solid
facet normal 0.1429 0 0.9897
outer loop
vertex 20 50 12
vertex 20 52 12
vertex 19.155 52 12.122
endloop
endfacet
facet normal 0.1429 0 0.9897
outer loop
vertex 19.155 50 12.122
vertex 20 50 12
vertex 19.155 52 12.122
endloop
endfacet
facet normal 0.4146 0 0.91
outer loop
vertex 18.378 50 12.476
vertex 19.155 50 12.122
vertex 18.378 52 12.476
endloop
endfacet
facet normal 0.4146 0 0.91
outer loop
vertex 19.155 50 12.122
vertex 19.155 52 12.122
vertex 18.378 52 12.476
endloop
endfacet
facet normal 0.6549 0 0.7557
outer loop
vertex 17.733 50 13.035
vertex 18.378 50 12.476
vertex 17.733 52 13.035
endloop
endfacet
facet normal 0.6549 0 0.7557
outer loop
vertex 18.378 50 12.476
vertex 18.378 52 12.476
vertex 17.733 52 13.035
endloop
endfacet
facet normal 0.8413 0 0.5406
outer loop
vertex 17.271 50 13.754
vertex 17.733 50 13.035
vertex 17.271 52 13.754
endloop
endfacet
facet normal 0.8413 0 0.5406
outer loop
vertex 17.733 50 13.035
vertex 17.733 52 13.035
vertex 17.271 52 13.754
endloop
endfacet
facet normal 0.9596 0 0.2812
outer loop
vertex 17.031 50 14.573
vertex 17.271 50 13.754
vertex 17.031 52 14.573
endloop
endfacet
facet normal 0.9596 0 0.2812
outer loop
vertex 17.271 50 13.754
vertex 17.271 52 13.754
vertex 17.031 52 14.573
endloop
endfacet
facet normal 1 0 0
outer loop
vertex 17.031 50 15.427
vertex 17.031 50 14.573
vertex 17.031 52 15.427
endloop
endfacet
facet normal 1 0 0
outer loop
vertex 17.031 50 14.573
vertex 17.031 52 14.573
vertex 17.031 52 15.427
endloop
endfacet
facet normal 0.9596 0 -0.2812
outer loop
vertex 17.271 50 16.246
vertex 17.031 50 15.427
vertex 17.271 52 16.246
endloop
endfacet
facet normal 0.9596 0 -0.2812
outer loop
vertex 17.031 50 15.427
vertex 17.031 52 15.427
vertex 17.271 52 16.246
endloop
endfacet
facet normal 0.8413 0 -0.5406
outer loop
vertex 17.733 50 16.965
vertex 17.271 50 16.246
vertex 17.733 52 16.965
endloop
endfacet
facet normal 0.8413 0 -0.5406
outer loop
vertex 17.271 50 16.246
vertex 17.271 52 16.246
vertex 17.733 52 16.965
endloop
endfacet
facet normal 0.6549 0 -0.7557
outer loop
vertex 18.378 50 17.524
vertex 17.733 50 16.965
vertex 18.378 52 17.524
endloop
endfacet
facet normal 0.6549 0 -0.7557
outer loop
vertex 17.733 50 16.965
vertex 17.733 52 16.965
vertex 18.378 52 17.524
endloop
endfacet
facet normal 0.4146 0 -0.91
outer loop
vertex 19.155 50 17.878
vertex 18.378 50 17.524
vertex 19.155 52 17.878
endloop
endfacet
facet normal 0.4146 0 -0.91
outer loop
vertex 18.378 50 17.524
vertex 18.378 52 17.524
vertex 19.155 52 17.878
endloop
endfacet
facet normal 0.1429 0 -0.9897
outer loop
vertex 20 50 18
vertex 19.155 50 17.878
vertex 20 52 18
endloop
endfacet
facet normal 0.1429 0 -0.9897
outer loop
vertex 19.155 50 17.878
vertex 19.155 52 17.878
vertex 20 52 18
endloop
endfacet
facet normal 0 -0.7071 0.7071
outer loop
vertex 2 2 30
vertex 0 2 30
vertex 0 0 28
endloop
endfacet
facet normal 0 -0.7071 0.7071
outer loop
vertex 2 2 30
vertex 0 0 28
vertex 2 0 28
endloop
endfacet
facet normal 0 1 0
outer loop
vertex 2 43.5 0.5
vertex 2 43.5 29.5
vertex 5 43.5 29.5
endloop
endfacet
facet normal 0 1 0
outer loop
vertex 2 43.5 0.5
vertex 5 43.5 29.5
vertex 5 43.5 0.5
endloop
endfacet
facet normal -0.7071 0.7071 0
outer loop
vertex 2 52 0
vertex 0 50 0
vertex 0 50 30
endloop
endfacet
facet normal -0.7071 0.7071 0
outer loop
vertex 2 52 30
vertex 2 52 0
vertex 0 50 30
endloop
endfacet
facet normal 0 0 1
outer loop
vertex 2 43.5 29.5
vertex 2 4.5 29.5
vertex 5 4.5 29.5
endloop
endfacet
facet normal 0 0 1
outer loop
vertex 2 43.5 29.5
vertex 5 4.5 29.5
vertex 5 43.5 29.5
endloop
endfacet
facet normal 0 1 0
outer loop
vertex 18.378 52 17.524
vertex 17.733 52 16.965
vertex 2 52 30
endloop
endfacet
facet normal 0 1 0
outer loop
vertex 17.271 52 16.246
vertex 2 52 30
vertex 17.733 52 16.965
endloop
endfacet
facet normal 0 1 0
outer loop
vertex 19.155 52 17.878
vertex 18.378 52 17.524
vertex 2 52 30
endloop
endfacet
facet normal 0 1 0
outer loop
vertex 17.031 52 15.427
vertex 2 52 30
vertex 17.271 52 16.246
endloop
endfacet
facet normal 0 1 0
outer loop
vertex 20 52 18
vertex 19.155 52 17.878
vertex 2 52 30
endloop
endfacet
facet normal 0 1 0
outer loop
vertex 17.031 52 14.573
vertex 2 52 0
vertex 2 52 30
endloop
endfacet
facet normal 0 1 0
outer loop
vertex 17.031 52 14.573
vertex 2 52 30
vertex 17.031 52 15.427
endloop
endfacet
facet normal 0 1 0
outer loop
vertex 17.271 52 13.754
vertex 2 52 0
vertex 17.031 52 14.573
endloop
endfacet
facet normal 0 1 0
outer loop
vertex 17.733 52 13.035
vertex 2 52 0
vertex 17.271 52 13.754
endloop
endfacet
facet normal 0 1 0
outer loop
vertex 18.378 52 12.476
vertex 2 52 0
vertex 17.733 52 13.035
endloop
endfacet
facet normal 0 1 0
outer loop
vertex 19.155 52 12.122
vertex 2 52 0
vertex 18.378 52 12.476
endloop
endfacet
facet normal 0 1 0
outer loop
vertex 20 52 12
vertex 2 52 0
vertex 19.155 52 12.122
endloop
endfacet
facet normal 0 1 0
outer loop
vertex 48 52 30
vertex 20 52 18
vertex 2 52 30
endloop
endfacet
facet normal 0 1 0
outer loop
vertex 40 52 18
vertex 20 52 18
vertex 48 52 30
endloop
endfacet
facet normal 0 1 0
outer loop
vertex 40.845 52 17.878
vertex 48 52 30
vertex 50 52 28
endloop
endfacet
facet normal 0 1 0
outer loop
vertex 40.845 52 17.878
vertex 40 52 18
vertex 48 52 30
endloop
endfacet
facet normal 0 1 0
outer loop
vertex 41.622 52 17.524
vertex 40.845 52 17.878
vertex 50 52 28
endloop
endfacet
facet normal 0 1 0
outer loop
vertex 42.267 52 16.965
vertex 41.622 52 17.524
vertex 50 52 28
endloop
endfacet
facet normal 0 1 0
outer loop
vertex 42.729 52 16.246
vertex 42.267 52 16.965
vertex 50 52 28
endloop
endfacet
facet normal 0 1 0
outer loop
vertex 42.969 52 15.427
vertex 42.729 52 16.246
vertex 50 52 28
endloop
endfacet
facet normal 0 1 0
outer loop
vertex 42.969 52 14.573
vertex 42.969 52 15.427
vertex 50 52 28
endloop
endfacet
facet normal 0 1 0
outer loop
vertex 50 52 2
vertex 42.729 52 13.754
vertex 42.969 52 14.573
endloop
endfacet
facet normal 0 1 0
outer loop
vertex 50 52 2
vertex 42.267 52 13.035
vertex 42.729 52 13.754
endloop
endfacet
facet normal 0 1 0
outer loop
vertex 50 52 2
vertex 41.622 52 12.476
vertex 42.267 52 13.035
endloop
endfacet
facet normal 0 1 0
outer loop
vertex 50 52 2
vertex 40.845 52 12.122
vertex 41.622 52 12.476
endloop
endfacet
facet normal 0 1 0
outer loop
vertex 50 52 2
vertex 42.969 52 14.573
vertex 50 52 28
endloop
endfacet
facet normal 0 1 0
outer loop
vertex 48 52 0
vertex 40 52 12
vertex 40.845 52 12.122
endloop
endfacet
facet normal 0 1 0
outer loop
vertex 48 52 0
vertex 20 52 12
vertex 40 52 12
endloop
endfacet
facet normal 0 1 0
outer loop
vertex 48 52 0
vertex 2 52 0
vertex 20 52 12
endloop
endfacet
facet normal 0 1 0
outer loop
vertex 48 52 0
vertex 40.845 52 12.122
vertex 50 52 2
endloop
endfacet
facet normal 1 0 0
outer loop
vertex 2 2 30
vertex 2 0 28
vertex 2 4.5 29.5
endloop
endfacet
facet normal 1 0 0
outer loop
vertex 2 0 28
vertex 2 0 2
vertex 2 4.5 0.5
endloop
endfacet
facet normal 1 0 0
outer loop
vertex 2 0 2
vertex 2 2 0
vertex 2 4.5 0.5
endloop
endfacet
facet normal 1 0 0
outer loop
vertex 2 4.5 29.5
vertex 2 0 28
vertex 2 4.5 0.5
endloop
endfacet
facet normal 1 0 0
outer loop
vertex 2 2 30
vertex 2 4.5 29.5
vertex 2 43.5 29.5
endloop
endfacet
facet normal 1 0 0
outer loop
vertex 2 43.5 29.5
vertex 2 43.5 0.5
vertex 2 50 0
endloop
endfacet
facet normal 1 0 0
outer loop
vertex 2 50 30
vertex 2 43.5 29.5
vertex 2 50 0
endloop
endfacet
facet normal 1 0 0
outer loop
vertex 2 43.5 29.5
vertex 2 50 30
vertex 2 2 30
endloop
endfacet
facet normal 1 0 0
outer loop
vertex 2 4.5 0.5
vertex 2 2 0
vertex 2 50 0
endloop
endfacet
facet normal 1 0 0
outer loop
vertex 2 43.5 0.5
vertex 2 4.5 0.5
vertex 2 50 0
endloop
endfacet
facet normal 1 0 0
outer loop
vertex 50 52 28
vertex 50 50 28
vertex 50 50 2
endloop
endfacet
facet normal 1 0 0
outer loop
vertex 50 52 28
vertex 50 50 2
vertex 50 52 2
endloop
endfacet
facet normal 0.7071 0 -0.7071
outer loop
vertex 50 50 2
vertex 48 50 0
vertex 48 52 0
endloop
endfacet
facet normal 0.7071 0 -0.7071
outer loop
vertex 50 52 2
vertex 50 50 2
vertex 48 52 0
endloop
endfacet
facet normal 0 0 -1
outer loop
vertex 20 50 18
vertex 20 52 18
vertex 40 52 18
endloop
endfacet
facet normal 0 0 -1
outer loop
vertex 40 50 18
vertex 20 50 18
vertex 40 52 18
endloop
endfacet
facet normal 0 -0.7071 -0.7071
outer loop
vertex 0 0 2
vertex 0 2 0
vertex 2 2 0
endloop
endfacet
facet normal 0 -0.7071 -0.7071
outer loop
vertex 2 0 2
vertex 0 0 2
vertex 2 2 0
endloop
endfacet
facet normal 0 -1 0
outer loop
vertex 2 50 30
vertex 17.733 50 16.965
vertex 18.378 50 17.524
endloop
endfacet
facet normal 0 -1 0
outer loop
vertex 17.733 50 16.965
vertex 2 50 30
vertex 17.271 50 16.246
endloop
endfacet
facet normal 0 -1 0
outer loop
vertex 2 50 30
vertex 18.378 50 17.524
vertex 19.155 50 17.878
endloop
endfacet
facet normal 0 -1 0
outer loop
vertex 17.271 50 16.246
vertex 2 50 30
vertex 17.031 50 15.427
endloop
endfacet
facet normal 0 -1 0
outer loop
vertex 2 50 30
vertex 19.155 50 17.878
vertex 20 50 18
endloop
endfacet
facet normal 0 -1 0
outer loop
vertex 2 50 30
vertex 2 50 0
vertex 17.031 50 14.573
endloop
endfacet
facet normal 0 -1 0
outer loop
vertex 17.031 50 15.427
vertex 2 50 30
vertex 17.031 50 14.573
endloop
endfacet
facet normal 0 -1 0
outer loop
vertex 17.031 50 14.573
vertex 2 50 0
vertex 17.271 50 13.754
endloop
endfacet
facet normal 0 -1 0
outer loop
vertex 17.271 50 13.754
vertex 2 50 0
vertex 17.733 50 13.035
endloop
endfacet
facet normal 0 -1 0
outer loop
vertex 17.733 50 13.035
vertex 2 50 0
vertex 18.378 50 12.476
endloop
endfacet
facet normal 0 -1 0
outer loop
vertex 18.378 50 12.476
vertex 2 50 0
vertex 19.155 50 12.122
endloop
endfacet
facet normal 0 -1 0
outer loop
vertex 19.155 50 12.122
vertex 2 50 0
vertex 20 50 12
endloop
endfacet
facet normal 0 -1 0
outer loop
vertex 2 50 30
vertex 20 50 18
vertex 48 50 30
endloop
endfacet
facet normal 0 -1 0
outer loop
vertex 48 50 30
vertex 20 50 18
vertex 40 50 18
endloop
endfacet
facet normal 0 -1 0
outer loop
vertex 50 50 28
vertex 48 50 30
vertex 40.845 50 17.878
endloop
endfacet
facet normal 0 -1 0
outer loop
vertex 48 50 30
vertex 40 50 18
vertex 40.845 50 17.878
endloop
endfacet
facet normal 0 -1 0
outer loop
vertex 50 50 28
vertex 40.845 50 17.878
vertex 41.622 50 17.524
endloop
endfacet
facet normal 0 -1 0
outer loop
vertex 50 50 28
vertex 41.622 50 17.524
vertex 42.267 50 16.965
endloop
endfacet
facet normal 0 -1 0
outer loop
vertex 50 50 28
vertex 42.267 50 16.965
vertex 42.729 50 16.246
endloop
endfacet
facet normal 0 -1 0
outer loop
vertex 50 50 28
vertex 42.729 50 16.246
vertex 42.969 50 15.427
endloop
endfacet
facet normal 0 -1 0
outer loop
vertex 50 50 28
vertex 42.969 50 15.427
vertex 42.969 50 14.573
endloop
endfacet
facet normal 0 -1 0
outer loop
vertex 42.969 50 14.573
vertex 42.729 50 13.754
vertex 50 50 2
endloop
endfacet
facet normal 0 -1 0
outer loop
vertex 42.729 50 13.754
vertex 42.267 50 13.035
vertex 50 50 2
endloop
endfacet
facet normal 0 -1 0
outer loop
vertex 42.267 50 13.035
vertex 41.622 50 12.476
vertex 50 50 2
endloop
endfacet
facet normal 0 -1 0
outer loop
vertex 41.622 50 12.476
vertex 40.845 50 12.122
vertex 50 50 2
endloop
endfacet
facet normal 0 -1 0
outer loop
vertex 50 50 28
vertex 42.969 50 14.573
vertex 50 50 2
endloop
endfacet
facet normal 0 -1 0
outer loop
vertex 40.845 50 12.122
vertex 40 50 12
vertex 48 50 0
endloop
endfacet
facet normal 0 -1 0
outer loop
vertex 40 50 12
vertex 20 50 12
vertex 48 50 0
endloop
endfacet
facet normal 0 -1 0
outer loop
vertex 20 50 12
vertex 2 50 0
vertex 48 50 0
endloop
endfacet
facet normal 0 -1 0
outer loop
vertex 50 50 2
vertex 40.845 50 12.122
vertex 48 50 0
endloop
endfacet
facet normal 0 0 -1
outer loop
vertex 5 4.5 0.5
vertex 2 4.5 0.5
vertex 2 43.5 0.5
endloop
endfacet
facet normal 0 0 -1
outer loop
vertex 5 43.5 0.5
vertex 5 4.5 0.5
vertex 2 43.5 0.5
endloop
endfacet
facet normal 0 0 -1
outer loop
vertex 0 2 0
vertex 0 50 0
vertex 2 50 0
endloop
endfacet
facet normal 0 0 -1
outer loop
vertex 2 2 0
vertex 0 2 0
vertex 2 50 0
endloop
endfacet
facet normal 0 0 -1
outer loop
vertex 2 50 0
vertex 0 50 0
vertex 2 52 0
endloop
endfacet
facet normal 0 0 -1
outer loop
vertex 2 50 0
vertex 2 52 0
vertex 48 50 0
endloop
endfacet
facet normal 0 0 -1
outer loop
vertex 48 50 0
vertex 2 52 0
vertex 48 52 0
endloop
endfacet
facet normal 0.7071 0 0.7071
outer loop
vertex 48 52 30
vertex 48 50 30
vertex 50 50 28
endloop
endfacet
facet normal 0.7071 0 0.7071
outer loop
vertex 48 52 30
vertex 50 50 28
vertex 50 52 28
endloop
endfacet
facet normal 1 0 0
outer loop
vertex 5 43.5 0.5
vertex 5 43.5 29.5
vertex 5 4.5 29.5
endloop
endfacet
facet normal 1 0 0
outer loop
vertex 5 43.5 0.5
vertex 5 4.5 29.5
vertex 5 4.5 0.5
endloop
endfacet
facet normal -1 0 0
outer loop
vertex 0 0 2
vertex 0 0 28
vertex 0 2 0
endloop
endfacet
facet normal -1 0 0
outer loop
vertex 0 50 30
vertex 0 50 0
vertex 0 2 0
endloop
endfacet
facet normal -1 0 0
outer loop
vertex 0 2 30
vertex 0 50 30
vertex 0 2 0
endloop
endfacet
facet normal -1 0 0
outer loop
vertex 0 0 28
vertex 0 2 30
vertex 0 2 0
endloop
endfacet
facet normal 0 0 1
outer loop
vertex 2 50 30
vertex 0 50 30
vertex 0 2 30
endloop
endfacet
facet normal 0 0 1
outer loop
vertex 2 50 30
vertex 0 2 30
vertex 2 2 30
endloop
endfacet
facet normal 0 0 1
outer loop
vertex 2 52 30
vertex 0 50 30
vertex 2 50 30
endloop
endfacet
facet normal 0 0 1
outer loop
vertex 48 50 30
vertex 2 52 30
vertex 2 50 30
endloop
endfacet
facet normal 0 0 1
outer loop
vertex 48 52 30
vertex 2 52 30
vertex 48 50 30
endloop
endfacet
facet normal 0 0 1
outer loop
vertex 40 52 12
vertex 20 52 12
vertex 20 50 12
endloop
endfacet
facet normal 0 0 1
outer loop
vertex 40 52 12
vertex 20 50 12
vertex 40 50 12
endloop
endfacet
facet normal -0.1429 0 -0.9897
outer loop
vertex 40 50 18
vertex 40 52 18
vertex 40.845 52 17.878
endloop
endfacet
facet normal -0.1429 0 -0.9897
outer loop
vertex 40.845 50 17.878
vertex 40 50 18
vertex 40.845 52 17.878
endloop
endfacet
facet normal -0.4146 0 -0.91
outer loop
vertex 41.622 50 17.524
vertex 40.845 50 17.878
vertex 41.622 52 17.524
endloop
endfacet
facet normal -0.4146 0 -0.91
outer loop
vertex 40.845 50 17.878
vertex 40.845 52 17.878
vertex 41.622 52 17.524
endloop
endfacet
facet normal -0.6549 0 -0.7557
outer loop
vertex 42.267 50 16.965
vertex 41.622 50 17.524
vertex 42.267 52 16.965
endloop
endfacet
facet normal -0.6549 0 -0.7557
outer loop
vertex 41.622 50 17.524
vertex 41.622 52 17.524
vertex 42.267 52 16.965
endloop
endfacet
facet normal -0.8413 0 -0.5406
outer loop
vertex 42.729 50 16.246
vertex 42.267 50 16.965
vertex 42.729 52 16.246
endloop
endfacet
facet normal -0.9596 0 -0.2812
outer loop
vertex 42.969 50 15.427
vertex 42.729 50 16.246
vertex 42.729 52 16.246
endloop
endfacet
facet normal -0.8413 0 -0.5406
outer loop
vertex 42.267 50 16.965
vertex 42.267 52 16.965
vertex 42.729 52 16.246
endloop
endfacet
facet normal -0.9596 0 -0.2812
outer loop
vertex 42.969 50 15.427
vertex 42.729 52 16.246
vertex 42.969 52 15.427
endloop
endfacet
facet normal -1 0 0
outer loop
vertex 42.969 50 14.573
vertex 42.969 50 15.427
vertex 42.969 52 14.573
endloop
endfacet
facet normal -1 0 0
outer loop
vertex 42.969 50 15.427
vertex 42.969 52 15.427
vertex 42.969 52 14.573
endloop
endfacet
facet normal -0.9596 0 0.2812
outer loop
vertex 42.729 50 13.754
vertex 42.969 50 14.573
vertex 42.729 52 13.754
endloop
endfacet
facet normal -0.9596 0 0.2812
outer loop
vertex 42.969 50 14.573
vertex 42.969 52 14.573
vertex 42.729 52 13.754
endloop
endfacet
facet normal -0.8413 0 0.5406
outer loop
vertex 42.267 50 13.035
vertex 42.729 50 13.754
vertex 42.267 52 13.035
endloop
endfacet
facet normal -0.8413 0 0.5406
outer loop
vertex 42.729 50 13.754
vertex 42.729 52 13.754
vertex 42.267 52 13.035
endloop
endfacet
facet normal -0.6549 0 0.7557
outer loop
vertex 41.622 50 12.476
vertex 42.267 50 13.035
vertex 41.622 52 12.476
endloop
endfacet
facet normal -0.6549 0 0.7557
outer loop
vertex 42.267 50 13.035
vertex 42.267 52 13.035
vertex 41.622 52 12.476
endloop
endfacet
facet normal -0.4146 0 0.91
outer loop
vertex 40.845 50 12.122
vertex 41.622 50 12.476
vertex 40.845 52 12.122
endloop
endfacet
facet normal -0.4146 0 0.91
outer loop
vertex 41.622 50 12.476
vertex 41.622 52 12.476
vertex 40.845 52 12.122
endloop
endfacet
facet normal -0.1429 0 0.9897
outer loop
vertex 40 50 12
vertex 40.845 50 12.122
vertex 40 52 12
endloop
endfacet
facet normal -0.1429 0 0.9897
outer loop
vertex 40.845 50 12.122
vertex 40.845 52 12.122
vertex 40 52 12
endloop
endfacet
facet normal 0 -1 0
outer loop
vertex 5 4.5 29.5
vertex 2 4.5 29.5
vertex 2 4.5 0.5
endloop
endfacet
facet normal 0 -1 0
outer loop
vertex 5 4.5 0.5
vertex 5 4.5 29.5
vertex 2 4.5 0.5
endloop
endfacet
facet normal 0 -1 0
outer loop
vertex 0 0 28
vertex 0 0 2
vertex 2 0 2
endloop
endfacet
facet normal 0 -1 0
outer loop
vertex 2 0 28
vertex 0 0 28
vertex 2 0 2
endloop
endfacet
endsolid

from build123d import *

# Parameters (mm, degrees)
ESBO_O1_W                = 2
ESBO_O1_H                = 50
ESBO_O1_W_2              = 50
ESBO_O1_H_2              = 2
RESSALTO_EXTRUS_O1_DEPTH = 30
CHANFRO1_SIZE            = 2
ESBO_O2_R                = 3
ESBO_O2_W                = 20
ESBO_O2_H                = 6
CORTE_EXTRUS_O1_DEPTH    = 15
ESBO_O3_W                = 29
ESBO_O3_H                = 39
RESSALTO_EXTRUS_O2_DEPTH = 3


with BuildPart() as part:
    # Esboço1 → Ressalto-extrusão1 (new body)
    with BuildSketch(Plane.XY):
        with Locations((1, 25)):
            Rectangle(ESBO_O1_W, ESBO_O1_H)
        with Locations((25, 51)):
            Rectangle(ESBO_O1_W_2, ESBO_O1_H_2)
    extrude(amount=RESSALTO_EXTRUS_O1_DEPTH)

    # Chanfro1
    chanfro1_edges = [part.edges().sort_by_distance(p)[0] for p in [
        (1, 0, 0),
        (50, 51, 0),
        (0, 52, 15),
        (50, 51, 30),
        (1, 0, 30),
    ]]
    chamfer(chanfro1_edges, length=CHANFRO1_SIZE)

    # Esboço2 → Corte-extrusão1 (cut)
    with BuildSketch(Plane(origin=(0, 52, 0), x_dir=(1, 0, 0), z_dir=(0, 1, 0))):
        with Locations((40, -15)):
            Circle(ESBO_O2_R)
        with Locations((20, -15)):
            Circle(ESBO_O2_R)
        with Locations((30, -15)):
            Rectangle(ESBO_O2_W, ESBO_O2_H)
    extrude(amount=-CORTE_EXTRUS_O1_DEPTH, mode=Mode.SUBTRACT)

    # Esboço3 → Ressalto-extrusão2 (add)
    with BuildSketch(Plane(origin=(2, 0, 0), x_dir=(0, 0, -1), z_dir=(1, 0, 0))):
        with Locations((-15, 24)):
            Rectangle(ESBO_O3_W, ESBO_O3_H)
    extrude(amount=RESSALTO_EXTRUS_O2_DEPTH)


solid = part.part
